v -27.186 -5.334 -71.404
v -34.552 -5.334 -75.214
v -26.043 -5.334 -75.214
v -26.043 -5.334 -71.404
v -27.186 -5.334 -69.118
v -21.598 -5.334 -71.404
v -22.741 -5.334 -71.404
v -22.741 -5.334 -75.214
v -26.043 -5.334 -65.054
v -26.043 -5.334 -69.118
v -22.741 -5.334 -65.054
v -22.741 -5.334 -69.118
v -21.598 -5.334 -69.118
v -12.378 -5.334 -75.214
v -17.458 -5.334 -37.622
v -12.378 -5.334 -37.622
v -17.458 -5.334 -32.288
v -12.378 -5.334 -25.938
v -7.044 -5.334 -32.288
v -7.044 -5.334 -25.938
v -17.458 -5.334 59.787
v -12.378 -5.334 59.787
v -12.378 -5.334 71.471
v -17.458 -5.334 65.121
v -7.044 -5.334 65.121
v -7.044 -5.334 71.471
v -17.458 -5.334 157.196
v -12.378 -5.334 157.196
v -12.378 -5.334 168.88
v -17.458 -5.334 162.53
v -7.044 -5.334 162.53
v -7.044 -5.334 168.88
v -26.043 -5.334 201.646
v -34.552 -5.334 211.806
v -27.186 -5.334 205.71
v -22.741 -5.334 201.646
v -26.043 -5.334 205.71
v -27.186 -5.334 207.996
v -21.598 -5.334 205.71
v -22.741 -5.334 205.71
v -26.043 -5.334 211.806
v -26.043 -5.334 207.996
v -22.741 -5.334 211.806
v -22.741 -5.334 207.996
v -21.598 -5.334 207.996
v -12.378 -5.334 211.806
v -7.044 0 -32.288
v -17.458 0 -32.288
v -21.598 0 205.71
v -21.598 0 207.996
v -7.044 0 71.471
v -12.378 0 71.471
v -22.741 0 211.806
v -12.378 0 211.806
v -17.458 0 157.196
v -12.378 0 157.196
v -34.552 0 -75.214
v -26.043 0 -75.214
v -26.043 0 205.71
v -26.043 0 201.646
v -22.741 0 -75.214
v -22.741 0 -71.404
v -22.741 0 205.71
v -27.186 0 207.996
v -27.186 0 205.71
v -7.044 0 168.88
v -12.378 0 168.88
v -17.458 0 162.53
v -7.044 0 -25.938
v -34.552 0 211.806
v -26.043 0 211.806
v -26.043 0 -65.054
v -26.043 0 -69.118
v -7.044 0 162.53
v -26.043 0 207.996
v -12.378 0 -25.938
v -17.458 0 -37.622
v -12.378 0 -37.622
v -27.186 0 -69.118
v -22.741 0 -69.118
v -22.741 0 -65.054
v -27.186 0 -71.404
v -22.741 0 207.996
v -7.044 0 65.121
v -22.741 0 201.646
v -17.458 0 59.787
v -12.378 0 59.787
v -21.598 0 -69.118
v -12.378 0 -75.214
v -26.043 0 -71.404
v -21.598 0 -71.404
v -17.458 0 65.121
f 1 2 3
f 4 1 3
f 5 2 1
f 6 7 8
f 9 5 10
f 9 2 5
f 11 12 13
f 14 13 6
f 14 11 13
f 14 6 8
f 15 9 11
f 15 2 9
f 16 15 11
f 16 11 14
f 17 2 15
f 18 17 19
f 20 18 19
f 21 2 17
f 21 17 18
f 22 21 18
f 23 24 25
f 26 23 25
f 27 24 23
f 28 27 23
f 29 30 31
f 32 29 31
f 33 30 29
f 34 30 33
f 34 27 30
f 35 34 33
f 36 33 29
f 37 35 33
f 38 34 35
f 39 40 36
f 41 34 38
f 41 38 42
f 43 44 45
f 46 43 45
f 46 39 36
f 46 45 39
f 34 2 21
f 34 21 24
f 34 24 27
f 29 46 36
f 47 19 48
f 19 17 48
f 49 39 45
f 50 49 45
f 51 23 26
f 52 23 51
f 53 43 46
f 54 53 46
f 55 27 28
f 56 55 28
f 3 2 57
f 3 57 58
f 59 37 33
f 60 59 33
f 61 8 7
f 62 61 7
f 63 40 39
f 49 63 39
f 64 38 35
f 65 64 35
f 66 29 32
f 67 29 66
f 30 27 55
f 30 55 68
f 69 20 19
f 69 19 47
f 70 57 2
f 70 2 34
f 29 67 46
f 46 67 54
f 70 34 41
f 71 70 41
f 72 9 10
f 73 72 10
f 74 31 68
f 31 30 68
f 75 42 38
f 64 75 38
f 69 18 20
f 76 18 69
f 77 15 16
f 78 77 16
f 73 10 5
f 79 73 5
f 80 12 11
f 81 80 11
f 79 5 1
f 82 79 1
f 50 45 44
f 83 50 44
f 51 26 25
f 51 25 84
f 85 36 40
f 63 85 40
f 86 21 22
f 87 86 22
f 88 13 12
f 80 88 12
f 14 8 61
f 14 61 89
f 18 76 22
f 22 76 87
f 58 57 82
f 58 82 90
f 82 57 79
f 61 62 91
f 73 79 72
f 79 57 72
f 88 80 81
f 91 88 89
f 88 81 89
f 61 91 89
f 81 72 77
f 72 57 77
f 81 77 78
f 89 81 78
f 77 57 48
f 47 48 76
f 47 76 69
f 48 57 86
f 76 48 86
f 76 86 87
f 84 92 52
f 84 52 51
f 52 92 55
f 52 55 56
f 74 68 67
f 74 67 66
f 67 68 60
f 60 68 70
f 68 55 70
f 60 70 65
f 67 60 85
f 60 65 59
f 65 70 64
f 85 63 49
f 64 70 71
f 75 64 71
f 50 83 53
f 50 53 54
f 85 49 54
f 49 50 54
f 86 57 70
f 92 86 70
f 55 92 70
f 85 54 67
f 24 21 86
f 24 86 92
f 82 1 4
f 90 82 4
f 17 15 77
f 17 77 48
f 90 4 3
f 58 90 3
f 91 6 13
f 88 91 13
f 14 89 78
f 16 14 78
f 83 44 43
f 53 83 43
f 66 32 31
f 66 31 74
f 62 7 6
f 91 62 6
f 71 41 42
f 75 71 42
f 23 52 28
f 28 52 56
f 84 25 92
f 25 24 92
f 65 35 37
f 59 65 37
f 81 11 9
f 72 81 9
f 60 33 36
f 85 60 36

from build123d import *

# Parameters (mm, degrees)
F0_W     = 22.1742
F0_H     = 292.1
F1_DEPTH = 5.334
F2_W     = 5.334
F2_H     = 6.35
F3_DEPTH = 5.334
F5_DEPTH = 5.335
F6_W     = 5.08
F6_H     = 5.334
F7_DEPTH = 25.4
F8_W     = 22.1742
F8_H     = 2.54
F9_DEPTH = 25.4


with BuildPart() as f1:
    # F0 (on Front) → F1 (new body)
    with BuildSketch(Plane.XZ):
        with Locations((-23.465344, 68.295897)):
            Rectangle(F0_W, F0_H)
    extrude(amount=F1_DEPTH)

    # F2 (on face) → F3 (join)
    with BuildSketch(Plane.YZ.offset(-12.378244)):
        with Locations((-2.667, 165.704897)):
            Rectangle(F2_W, F2_H)
        with Locations((-2.667, 68.295897)):
            Rectangle(F2_W, F2_H)
        with Locations((-2.667, -29.113103)):
            Rectangle(F2_W, F2_H)
    extrude(amount=F3_DEPTH)

    # F4 (on face) → F5 (cut, through all)
    with BuildSketch(Plane.XZ.offset(5.334)):
        Polygon((-26.043444, -71.404103), (-26.043444, -77.754103), (-22.741444, -77.754103), (-22.741444, -71.404103), (-21.598444, -71.404103), (-21.598444, -69.118103), (-22.741444, -69.118103), (-22.741444, -65.054103), (-26.043444, -65.054103), (-26.043444, -69.118103), (-27.186444, -69.118103), (-27.186444, -71.404103), align=None)
        Polygon((-26.043444, 214.345897), (-26.043444, 207.995897), (-27.186444, 207.995897), (-27.186444, 205.709897), (-26.043444, 205.709897), (-26.043444, 201.645897), (-22.741444, 201.645897), (-22.741444, 205.709897), (-21.598444, 205.709897), (-21.598444, 207.995897), (-22.741444, 207.995897), (-22.741444, 214.345897), align=None)
    extrude(amount=-F5_DEPTH, mode=Mode.SUBTRACT)

    # F6 (on face) → F7 (cut)
    with BuildSketch(Plane.XZ.offset(5.334)):
        with Locations((-14.918244, 159.862897)):
            Rectangle(F6_W, F6_H)
        with Locations((-14.918244, 62.453897)):
            Rectangle(F6_W, F6_H)
        with Locations((-14.918244, -34.955103)):
            Rectangle(F6_W, F6_H)
    extrude(amount=-F7_DEPTH, mode=Mode.SUBTRACT)

    # F8 (on face) → F9 (cut)
    with BuildSketch(Plane.XZ.offset(5.334)):
        with Locations((-23.465344, 213.075897)):
            Rectangle(F8_W, F8_H)
        with Locations((-23.465344, -76.484103)):
            Rectangle(F8_W, F8_H)
    extrude(amount=-F9_DEPTH, mode=Mode.SUBTRACT)


solid = f1.part
